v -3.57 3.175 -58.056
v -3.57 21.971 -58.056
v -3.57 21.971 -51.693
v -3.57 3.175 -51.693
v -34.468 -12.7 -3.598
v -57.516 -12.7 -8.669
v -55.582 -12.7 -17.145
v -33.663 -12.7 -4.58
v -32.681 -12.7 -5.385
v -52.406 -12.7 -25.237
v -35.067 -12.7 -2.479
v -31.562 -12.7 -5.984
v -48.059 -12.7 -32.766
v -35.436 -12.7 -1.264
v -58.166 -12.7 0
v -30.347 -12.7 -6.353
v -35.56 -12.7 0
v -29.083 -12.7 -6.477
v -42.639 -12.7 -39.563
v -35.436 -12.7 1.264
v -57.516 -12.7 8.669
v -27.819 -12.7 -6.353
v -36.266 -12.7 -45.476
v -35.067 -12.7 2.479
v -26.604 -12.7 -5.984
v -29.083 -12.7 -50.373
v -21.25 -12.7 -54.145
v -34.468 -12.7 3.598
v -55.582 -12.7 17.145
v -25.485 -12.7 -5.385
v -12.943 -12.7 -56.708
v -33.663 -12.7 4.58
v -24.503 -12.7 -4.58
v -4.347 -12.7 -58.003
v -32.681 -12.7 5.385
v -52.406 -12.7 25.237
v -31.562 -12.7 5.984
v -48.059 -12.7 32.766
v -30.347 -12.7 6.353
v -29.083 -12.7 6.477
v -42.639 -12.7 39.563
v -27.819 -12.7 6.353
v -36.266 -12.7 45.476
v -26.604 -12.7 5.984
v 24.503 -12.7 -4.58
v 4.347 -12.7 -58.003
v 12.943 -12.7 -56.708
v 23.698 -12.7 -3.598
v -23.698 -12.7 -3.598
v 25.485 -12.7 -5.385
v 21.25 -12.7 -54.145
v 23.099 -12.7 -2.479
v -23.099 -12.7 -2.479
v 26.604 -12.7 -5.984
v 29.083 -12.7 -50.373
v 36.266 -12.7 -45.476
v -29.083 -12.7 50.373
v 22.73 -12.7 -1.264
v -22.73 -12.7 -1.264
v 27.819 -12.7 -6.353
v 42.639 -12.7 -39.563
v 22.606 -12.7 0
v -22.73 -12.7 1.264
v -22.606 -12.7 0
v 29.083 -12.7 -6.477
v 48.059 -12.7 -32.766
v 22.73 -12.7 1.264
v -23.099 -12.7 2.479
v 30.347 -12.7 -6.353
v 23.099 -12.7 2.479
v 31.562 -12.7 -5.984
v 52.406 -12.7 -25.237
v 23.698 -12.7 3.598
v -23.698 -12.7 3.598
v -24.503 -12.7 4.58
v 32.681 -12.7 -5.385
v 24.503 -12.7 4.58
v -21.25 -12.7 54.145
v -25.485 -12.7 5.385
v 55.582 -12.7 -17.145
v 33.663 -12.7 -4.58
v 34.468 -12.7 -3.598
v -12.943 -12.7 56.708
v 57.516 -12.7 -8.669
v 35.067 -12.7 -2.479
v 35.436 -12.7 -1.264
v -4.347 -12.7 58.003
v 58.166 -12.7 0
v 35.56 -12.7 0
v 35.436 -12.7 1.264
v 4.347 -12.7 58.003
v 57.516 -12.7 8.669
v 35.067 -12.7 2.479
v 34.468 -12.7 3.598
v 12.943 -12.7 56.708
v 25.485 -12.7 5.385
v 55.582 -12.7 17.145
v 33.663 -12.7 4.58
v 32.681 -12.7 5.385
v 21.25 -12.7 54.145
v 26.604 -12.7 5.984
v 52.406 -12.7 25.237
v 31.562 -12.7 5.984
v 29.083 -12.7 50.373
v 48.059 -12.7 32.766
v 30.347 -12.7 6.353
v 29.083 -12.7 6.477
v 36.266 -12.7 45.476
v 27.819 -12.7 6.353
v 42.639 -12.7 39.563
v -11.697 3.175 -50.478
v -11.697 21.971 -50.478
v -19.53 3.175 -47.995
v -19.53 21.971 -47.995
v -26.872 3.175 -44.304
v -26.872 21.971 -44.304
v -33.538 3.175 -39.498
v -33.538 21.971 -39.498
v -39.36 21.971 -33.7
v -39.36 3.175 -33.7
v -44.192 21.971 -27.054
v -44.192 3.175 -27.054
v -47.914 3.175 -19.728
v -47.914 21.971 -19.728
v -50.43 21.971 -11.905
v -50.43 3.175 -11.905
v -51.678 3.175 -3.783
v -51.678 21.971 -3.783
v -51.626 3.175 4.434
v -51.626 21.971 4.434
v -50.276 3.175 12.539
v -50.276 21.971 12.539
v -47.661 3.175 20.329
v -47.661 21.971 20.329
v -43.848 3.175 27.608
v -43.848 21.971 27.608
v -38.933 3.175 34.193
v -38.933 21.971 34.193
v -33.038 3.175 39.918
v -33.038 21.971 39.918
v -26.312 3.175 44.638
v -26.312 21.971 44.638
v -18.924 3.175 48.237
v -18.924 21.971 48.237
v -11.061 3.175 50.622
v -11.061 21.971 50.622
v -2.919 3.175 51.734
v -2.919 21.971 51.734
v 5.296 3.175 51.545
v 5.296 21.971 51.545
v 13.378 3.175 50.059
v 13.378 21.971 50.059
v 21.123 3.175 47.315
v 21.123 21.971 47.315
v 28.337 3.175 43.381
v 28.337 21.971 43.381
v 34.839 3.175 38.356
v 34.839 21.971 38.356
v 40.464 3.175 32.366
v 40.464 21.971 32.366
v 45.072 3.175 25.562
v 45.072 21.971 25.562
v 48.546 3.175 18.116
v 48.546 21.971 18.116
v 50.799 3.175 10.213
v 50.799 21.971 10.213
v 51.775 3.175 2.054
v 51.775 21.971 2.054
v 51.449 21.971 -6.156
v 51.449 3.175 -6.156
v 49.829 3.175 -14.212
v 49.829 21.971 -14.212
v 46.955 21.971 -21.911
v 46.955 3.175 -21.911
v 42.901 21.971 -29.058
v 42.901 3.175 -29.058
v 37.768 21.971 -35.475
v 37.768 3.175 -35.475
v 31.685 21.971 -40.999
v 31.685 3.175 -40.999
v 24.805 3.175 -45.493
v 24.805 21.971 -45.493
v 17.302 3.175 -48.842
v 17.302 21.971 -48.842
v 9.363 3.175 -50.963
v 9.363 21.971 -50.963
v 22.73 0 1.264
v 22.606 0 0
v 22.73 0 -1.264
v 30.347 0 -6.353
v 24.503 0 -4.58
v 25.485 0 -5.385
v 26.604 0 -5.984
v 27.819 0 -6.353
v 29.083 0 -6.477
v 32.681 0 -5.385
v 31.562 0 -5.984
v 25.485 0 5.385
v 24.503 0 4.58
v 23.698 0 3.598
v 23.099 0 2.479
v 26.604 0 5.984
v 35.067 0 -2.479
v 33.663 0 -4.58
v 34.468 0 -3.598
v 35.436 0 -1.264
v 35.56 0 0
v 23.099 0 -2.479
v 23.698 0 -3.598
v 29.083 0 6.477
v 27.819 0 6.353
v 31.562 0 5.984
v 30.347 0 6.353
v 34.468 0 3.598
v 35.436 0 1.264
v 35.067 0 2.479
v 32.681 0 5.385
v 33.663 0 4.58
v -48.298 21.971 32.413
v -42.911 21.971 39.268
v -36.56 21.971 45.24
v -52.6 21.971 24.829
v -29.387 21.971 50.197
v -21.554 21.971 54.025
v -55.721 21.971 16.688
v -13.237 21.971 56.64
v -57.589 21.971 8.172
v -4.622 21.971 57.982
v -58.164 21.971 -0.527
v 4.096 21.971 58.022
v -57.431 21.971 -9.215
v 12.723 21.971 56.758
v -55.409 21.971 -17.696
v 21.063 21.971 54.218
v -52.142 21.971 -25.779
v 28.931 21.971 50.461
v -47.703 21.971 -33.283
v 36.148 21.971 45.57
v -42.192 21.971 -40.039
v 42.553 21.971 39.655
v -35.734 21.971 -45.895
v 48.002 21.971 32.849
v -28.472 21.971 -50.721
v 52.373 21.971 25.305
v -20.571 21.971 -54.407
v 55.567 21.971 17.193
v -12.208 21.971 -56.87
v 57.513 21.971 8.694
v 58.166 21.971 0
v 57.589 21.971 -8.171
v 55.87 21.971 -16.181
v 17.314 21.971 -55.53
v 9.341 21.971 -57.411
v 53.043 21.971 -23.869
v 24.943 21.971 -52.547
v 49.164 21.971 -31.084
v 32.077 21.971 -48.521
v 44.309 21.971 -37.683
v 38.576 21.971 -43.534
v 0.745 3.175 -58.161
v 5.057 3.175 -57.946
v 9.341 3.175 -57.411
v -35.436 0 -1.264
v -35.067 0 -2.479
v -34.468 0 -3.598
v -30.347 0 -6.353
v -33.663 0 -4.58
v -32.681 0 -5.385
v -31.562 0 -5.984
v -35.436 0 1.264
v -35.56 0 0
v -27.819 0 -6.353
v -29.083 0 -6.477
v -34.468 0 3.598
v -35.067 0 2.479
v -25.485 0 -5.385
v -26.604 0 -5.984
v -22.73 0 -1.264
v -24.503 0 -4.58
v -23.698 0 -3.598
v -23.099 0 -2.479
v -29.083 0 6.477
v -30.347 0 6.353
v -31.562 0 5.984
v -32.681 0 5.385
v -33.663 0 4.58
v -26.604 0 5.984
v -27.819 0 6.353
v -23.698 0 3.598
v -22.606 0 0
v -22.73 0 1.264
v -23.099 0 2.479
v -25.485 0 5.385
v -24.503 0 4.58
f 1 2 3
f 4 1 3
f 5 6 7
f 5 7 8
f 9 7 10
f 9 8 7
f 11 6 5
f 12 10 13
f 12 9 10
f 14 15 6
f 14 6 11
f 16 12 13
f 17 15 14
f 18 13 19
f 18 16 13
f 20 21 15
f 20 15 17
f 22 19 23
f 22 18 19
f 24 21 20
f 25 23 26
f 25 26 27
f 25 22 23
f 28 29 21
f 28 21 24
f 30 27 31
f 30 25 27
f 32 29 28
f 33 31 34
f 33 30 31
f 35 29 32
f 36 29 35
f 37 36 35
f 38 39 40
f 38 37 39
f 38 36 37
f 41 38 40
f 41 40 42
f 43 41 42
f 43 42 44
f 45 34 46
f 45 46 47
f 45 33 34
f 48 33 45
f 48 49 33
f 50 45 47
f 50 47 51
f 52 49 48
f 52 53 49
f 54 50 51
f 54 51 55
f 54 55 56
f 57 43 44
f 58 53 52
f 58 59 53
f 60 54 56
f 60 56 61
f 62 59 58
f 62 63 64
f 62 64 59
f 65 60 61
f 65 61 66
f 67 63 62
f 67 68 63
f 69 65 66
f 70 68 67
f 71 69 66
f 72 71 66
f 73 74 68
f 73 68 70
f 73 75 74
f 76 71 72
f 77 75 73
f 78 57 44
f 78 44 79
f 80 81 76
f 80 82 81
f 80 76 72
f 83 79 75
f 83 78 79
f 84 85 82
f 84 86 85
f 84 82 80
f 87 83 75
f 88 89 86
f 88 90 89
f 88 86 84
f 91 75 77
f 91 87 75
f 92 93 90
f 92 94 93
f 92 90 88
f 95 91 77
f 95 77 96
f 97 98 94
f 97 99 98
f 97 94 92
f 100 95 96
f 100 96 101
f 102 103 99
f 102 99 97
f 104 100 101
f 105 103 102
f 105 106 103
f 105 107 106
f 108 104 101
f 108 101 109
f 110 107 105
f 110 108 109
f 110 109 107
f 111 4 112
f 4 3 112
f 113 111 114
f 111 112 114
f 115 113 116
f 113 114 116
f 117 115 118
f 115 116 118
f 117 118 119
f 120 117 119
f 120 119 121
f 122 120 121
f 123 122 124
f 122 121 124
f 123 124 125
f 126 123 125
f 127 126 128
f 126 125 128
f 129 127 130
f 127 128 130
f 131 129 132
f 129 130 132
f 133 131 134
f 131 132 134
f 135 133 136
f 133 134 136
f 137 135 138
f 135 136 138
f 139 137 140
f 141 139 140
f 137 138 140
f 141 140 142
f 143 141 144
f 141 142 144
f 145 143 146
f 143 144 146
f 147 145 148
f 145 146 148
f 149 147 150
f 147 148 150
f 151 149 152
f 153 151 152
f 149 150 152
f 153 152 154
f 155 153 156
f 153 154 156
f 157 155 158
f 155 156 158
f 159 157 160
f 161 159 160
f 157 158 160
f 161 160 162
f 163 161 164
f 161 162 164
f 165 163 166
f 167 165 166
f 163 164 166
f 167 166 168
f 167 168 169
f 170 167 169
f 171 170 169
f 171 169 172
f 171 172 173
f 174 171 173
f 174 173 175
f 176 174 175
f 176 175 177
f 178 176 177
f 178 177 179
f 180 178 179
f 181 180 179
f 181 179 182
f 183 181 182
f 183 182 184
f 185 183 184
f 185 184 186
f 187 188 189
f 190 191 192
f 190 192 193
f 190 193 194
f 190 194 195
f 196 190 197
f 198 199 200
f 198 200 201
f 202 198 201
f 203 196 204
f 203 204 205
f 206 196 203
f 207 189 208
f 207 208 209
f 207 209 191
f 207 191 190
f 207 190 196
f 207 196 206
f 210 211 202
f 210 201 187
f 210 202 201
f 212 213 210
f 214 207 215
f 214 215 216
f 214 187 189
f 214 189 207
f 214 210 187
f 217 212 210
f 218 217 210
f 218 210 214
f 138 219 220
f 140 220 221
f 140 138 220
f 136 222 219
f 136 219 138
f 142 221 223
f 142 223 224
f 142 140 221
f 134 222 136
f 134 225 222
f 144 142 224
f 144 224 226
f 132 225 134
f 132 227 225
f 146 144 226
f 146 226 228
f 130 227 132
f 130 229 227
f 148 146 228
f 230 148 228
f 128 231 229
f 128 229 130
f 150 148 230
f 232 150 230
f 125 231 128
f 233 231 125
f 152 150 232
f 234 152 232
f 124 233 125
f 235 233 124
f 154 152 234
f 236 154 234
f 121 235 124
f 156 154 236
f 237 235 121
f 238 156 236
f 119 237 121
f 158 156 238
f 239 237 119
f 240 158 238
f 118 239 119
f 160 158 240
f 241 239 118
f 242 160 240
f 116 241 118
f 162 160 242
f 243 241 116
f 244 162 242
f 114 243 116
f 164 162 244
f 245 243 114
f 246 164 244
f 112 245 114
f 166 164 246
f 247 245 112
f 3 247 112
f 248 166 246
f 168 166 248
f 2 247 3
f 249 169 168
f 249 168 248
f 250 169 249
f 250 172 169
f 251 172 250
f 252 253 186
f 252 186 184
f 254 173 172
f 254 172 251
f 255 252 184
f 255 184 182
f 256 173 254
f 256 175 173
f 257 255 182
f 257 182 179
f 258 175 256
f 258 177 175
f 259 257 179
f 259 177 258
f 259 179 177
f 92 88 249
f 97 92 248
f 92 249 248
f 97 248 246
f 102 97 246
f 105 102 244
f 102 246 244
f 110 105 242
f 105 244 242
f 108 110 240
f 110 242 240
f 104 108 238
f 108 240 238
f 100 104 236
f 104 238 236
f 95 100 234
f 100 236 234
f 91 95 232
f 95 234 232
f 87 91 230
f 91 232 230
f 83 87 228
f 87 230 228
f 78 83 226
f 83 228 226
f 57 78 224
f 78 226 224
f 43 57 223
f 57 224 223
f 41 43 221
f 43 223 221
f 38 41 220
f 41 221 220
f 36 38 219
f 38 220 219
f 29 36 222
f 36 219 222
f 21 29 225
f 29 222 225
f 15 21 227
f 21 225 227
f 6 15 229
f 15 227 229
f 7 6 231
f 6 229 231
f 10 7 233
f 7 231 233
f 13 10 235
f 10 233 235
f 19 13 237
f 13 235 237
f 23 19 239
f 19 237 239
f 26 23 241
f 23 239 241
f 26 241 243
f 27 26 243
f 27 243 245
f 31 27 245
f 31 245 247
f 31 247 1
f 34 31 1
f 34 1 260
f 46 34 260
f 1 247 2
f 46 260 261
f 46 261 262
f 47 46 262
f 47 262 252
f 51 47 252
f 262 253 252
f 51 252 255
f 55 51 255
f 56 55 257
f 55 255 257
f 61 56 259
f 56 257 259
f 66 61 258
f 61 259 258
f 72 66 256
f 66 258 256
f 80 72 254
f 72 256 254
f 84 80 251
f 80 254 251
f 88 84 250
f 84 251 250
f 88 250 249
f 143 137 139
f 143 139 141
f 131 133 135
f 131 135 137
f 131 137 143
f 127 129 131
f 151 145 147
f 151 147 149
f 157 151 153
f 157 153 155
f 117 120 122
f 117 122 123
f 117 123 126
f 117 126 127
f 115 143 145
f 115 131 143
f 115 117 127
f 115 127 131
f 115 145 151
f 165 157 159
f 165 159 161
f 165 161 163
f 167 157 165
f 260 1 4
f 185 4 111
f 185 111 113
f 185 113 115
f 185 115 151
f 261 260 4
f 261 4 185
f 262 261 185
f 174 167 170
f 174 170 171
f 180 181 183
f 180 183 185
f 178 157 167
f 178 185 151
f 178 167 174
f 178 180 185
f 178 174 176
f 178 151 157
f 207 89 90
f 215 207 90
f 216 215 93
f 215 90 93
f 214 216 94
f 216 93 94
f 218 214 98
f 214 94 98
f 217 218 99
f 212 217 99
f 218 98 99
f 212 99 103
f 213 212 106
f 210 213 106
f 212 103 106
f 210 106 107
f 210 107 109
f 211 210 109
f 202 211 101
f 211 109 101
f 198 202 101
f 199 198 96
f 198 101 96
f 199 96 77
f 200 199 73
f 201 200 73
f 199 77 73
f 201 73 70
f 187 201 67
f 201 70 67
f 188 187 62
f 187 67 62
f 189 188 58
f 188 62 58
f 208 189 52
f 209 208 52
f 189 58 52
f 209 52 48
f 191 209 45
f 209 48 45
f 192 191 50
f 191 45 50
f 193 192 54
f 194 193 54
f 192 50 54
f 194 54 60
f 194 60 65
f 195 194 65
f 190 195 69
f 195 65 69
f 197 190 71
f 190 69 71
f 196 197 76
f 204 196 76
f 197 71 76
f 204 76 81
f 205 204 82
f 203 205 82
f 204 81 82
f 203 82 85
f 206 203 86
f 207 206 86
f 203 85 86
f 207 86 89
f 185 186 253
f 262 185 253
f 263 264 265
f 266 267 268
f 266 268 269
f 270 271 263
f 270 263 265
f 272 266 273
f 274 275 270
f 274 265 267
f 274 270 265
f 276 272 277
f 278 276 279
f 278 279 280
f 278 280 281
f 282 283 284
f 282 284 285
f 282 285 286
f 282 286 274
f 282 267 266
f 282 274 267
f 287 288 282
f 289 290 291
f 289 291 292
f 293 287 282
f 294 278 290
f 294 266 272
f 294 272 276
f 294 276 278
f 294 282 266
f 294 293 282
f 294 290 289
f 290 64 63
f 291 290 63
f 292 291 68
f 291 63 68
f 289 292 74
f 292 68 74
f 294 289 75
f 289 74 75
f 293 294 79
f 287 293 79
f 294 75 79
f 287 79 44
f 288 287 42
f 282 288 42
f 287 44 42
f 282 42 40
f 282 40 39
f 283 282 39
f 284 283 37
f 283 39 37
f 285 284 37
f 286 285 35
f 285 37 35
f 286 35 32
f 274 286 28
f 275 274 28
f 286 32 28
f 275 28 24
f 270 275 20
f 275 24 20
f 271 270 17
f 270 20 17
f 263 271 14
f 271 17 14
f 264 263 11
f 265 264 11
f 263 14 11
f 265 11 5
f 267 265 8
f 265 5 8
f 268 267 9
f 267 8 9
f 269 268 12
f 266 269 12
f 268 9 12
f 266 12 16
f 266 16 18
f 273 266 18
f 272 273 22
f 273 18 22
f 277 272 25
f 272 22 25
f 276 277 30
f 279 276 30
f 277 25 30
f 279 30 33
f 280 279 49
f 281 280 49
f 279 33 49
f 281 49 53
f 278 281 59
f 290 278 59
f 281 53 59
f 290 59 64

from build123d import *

# Parameters (mm, degrees)
SKETCH1_R           = 58.166
BOSS_EXTRUDE1_DEPTH = 21.971
SKETCH3_R           = 51.816
CUT_EXTRUDE2_DEPTH  = 18.796
CUT_EXTRUDE7_DEPTH  = 18.796
SKETCH8_R           = 58.166
BOSS_EXTRUDE4_DEPTH = 12.7
SKETCH9_R           = 6.477
CUT_EXTRUDE8_DEPTH  = 12.7


with BuildPart() as part:
    # Sketch1 → Boss-Extrude1 (new body)
    with BuildSketch(Plane(origin=(0, 0, 0), x_dir=(1, 0, 0), z_dir=(0, 1, 0))):
        Circle(SKETCH1_R)
    extrude(amount=BOSS_EXTRUDE1_DEPTH)

    # Sketch3 → Cut-Extrude2 (cut)
    with BuildSketch(Plane(origin=(0, 21.971, 0), x_dir=(1, 0, 0), z_dir=(0, 1, 0))):
        Circle(SKETCH3_R)
    extrude(amount=-CUT_EXTRUDE2_DEPTH, mode=Mode.SUBTRACT)

    # Sketch6 → Cut-Extrude7 (cut)
    with BuildSketch(Plane(origin=(0, 21.971, 0), x_dir=(1, 0, 0), z_dir=(0, 1, 0))):
        with BuildLine():
            Line((9.363048829, 50.963037318), (9.340756891, 57.411094892))
            ThreePointArc((9.340756891, 57.411094892), (2.903170649, 58.093503563), (-3.57037671, 58.056317194))
            Line((-3.57037671, 58.056317194), (-3.57037671, 51.692845406))
            ThreePointArc((-3.57037671, 51.692845406), (2.919232353, 51.733702153), (9.363048829, 50.963037318))
        make_face()
    extrude(amount=-CUT_EXTRUDE7_DEPTH, mode=Mode.SUBTRACT)

    # Sketch8 → Boss-Extrude4 (add)
    with BuildSketch(Plane.XZ):
        Circle(SKETCH8_R)
    extrude(amount=BOSS_EXTRUDE4_DEPTH)

    # Sketch9 → Cut-Extrude8 (cut)
    with BuildSketch(Plane.XZ.offset(12.7)):
        with Locations((-29.083, 0)):
            Circle(SKETCH9_R)
        with Locations((29.083, 0)):
            Circle(SKETCH9_R)
    extrude(amount=-CUT_EXTRUDE8_DEPTH, mode=Mode.SUBTRACT)


solid = part.part
